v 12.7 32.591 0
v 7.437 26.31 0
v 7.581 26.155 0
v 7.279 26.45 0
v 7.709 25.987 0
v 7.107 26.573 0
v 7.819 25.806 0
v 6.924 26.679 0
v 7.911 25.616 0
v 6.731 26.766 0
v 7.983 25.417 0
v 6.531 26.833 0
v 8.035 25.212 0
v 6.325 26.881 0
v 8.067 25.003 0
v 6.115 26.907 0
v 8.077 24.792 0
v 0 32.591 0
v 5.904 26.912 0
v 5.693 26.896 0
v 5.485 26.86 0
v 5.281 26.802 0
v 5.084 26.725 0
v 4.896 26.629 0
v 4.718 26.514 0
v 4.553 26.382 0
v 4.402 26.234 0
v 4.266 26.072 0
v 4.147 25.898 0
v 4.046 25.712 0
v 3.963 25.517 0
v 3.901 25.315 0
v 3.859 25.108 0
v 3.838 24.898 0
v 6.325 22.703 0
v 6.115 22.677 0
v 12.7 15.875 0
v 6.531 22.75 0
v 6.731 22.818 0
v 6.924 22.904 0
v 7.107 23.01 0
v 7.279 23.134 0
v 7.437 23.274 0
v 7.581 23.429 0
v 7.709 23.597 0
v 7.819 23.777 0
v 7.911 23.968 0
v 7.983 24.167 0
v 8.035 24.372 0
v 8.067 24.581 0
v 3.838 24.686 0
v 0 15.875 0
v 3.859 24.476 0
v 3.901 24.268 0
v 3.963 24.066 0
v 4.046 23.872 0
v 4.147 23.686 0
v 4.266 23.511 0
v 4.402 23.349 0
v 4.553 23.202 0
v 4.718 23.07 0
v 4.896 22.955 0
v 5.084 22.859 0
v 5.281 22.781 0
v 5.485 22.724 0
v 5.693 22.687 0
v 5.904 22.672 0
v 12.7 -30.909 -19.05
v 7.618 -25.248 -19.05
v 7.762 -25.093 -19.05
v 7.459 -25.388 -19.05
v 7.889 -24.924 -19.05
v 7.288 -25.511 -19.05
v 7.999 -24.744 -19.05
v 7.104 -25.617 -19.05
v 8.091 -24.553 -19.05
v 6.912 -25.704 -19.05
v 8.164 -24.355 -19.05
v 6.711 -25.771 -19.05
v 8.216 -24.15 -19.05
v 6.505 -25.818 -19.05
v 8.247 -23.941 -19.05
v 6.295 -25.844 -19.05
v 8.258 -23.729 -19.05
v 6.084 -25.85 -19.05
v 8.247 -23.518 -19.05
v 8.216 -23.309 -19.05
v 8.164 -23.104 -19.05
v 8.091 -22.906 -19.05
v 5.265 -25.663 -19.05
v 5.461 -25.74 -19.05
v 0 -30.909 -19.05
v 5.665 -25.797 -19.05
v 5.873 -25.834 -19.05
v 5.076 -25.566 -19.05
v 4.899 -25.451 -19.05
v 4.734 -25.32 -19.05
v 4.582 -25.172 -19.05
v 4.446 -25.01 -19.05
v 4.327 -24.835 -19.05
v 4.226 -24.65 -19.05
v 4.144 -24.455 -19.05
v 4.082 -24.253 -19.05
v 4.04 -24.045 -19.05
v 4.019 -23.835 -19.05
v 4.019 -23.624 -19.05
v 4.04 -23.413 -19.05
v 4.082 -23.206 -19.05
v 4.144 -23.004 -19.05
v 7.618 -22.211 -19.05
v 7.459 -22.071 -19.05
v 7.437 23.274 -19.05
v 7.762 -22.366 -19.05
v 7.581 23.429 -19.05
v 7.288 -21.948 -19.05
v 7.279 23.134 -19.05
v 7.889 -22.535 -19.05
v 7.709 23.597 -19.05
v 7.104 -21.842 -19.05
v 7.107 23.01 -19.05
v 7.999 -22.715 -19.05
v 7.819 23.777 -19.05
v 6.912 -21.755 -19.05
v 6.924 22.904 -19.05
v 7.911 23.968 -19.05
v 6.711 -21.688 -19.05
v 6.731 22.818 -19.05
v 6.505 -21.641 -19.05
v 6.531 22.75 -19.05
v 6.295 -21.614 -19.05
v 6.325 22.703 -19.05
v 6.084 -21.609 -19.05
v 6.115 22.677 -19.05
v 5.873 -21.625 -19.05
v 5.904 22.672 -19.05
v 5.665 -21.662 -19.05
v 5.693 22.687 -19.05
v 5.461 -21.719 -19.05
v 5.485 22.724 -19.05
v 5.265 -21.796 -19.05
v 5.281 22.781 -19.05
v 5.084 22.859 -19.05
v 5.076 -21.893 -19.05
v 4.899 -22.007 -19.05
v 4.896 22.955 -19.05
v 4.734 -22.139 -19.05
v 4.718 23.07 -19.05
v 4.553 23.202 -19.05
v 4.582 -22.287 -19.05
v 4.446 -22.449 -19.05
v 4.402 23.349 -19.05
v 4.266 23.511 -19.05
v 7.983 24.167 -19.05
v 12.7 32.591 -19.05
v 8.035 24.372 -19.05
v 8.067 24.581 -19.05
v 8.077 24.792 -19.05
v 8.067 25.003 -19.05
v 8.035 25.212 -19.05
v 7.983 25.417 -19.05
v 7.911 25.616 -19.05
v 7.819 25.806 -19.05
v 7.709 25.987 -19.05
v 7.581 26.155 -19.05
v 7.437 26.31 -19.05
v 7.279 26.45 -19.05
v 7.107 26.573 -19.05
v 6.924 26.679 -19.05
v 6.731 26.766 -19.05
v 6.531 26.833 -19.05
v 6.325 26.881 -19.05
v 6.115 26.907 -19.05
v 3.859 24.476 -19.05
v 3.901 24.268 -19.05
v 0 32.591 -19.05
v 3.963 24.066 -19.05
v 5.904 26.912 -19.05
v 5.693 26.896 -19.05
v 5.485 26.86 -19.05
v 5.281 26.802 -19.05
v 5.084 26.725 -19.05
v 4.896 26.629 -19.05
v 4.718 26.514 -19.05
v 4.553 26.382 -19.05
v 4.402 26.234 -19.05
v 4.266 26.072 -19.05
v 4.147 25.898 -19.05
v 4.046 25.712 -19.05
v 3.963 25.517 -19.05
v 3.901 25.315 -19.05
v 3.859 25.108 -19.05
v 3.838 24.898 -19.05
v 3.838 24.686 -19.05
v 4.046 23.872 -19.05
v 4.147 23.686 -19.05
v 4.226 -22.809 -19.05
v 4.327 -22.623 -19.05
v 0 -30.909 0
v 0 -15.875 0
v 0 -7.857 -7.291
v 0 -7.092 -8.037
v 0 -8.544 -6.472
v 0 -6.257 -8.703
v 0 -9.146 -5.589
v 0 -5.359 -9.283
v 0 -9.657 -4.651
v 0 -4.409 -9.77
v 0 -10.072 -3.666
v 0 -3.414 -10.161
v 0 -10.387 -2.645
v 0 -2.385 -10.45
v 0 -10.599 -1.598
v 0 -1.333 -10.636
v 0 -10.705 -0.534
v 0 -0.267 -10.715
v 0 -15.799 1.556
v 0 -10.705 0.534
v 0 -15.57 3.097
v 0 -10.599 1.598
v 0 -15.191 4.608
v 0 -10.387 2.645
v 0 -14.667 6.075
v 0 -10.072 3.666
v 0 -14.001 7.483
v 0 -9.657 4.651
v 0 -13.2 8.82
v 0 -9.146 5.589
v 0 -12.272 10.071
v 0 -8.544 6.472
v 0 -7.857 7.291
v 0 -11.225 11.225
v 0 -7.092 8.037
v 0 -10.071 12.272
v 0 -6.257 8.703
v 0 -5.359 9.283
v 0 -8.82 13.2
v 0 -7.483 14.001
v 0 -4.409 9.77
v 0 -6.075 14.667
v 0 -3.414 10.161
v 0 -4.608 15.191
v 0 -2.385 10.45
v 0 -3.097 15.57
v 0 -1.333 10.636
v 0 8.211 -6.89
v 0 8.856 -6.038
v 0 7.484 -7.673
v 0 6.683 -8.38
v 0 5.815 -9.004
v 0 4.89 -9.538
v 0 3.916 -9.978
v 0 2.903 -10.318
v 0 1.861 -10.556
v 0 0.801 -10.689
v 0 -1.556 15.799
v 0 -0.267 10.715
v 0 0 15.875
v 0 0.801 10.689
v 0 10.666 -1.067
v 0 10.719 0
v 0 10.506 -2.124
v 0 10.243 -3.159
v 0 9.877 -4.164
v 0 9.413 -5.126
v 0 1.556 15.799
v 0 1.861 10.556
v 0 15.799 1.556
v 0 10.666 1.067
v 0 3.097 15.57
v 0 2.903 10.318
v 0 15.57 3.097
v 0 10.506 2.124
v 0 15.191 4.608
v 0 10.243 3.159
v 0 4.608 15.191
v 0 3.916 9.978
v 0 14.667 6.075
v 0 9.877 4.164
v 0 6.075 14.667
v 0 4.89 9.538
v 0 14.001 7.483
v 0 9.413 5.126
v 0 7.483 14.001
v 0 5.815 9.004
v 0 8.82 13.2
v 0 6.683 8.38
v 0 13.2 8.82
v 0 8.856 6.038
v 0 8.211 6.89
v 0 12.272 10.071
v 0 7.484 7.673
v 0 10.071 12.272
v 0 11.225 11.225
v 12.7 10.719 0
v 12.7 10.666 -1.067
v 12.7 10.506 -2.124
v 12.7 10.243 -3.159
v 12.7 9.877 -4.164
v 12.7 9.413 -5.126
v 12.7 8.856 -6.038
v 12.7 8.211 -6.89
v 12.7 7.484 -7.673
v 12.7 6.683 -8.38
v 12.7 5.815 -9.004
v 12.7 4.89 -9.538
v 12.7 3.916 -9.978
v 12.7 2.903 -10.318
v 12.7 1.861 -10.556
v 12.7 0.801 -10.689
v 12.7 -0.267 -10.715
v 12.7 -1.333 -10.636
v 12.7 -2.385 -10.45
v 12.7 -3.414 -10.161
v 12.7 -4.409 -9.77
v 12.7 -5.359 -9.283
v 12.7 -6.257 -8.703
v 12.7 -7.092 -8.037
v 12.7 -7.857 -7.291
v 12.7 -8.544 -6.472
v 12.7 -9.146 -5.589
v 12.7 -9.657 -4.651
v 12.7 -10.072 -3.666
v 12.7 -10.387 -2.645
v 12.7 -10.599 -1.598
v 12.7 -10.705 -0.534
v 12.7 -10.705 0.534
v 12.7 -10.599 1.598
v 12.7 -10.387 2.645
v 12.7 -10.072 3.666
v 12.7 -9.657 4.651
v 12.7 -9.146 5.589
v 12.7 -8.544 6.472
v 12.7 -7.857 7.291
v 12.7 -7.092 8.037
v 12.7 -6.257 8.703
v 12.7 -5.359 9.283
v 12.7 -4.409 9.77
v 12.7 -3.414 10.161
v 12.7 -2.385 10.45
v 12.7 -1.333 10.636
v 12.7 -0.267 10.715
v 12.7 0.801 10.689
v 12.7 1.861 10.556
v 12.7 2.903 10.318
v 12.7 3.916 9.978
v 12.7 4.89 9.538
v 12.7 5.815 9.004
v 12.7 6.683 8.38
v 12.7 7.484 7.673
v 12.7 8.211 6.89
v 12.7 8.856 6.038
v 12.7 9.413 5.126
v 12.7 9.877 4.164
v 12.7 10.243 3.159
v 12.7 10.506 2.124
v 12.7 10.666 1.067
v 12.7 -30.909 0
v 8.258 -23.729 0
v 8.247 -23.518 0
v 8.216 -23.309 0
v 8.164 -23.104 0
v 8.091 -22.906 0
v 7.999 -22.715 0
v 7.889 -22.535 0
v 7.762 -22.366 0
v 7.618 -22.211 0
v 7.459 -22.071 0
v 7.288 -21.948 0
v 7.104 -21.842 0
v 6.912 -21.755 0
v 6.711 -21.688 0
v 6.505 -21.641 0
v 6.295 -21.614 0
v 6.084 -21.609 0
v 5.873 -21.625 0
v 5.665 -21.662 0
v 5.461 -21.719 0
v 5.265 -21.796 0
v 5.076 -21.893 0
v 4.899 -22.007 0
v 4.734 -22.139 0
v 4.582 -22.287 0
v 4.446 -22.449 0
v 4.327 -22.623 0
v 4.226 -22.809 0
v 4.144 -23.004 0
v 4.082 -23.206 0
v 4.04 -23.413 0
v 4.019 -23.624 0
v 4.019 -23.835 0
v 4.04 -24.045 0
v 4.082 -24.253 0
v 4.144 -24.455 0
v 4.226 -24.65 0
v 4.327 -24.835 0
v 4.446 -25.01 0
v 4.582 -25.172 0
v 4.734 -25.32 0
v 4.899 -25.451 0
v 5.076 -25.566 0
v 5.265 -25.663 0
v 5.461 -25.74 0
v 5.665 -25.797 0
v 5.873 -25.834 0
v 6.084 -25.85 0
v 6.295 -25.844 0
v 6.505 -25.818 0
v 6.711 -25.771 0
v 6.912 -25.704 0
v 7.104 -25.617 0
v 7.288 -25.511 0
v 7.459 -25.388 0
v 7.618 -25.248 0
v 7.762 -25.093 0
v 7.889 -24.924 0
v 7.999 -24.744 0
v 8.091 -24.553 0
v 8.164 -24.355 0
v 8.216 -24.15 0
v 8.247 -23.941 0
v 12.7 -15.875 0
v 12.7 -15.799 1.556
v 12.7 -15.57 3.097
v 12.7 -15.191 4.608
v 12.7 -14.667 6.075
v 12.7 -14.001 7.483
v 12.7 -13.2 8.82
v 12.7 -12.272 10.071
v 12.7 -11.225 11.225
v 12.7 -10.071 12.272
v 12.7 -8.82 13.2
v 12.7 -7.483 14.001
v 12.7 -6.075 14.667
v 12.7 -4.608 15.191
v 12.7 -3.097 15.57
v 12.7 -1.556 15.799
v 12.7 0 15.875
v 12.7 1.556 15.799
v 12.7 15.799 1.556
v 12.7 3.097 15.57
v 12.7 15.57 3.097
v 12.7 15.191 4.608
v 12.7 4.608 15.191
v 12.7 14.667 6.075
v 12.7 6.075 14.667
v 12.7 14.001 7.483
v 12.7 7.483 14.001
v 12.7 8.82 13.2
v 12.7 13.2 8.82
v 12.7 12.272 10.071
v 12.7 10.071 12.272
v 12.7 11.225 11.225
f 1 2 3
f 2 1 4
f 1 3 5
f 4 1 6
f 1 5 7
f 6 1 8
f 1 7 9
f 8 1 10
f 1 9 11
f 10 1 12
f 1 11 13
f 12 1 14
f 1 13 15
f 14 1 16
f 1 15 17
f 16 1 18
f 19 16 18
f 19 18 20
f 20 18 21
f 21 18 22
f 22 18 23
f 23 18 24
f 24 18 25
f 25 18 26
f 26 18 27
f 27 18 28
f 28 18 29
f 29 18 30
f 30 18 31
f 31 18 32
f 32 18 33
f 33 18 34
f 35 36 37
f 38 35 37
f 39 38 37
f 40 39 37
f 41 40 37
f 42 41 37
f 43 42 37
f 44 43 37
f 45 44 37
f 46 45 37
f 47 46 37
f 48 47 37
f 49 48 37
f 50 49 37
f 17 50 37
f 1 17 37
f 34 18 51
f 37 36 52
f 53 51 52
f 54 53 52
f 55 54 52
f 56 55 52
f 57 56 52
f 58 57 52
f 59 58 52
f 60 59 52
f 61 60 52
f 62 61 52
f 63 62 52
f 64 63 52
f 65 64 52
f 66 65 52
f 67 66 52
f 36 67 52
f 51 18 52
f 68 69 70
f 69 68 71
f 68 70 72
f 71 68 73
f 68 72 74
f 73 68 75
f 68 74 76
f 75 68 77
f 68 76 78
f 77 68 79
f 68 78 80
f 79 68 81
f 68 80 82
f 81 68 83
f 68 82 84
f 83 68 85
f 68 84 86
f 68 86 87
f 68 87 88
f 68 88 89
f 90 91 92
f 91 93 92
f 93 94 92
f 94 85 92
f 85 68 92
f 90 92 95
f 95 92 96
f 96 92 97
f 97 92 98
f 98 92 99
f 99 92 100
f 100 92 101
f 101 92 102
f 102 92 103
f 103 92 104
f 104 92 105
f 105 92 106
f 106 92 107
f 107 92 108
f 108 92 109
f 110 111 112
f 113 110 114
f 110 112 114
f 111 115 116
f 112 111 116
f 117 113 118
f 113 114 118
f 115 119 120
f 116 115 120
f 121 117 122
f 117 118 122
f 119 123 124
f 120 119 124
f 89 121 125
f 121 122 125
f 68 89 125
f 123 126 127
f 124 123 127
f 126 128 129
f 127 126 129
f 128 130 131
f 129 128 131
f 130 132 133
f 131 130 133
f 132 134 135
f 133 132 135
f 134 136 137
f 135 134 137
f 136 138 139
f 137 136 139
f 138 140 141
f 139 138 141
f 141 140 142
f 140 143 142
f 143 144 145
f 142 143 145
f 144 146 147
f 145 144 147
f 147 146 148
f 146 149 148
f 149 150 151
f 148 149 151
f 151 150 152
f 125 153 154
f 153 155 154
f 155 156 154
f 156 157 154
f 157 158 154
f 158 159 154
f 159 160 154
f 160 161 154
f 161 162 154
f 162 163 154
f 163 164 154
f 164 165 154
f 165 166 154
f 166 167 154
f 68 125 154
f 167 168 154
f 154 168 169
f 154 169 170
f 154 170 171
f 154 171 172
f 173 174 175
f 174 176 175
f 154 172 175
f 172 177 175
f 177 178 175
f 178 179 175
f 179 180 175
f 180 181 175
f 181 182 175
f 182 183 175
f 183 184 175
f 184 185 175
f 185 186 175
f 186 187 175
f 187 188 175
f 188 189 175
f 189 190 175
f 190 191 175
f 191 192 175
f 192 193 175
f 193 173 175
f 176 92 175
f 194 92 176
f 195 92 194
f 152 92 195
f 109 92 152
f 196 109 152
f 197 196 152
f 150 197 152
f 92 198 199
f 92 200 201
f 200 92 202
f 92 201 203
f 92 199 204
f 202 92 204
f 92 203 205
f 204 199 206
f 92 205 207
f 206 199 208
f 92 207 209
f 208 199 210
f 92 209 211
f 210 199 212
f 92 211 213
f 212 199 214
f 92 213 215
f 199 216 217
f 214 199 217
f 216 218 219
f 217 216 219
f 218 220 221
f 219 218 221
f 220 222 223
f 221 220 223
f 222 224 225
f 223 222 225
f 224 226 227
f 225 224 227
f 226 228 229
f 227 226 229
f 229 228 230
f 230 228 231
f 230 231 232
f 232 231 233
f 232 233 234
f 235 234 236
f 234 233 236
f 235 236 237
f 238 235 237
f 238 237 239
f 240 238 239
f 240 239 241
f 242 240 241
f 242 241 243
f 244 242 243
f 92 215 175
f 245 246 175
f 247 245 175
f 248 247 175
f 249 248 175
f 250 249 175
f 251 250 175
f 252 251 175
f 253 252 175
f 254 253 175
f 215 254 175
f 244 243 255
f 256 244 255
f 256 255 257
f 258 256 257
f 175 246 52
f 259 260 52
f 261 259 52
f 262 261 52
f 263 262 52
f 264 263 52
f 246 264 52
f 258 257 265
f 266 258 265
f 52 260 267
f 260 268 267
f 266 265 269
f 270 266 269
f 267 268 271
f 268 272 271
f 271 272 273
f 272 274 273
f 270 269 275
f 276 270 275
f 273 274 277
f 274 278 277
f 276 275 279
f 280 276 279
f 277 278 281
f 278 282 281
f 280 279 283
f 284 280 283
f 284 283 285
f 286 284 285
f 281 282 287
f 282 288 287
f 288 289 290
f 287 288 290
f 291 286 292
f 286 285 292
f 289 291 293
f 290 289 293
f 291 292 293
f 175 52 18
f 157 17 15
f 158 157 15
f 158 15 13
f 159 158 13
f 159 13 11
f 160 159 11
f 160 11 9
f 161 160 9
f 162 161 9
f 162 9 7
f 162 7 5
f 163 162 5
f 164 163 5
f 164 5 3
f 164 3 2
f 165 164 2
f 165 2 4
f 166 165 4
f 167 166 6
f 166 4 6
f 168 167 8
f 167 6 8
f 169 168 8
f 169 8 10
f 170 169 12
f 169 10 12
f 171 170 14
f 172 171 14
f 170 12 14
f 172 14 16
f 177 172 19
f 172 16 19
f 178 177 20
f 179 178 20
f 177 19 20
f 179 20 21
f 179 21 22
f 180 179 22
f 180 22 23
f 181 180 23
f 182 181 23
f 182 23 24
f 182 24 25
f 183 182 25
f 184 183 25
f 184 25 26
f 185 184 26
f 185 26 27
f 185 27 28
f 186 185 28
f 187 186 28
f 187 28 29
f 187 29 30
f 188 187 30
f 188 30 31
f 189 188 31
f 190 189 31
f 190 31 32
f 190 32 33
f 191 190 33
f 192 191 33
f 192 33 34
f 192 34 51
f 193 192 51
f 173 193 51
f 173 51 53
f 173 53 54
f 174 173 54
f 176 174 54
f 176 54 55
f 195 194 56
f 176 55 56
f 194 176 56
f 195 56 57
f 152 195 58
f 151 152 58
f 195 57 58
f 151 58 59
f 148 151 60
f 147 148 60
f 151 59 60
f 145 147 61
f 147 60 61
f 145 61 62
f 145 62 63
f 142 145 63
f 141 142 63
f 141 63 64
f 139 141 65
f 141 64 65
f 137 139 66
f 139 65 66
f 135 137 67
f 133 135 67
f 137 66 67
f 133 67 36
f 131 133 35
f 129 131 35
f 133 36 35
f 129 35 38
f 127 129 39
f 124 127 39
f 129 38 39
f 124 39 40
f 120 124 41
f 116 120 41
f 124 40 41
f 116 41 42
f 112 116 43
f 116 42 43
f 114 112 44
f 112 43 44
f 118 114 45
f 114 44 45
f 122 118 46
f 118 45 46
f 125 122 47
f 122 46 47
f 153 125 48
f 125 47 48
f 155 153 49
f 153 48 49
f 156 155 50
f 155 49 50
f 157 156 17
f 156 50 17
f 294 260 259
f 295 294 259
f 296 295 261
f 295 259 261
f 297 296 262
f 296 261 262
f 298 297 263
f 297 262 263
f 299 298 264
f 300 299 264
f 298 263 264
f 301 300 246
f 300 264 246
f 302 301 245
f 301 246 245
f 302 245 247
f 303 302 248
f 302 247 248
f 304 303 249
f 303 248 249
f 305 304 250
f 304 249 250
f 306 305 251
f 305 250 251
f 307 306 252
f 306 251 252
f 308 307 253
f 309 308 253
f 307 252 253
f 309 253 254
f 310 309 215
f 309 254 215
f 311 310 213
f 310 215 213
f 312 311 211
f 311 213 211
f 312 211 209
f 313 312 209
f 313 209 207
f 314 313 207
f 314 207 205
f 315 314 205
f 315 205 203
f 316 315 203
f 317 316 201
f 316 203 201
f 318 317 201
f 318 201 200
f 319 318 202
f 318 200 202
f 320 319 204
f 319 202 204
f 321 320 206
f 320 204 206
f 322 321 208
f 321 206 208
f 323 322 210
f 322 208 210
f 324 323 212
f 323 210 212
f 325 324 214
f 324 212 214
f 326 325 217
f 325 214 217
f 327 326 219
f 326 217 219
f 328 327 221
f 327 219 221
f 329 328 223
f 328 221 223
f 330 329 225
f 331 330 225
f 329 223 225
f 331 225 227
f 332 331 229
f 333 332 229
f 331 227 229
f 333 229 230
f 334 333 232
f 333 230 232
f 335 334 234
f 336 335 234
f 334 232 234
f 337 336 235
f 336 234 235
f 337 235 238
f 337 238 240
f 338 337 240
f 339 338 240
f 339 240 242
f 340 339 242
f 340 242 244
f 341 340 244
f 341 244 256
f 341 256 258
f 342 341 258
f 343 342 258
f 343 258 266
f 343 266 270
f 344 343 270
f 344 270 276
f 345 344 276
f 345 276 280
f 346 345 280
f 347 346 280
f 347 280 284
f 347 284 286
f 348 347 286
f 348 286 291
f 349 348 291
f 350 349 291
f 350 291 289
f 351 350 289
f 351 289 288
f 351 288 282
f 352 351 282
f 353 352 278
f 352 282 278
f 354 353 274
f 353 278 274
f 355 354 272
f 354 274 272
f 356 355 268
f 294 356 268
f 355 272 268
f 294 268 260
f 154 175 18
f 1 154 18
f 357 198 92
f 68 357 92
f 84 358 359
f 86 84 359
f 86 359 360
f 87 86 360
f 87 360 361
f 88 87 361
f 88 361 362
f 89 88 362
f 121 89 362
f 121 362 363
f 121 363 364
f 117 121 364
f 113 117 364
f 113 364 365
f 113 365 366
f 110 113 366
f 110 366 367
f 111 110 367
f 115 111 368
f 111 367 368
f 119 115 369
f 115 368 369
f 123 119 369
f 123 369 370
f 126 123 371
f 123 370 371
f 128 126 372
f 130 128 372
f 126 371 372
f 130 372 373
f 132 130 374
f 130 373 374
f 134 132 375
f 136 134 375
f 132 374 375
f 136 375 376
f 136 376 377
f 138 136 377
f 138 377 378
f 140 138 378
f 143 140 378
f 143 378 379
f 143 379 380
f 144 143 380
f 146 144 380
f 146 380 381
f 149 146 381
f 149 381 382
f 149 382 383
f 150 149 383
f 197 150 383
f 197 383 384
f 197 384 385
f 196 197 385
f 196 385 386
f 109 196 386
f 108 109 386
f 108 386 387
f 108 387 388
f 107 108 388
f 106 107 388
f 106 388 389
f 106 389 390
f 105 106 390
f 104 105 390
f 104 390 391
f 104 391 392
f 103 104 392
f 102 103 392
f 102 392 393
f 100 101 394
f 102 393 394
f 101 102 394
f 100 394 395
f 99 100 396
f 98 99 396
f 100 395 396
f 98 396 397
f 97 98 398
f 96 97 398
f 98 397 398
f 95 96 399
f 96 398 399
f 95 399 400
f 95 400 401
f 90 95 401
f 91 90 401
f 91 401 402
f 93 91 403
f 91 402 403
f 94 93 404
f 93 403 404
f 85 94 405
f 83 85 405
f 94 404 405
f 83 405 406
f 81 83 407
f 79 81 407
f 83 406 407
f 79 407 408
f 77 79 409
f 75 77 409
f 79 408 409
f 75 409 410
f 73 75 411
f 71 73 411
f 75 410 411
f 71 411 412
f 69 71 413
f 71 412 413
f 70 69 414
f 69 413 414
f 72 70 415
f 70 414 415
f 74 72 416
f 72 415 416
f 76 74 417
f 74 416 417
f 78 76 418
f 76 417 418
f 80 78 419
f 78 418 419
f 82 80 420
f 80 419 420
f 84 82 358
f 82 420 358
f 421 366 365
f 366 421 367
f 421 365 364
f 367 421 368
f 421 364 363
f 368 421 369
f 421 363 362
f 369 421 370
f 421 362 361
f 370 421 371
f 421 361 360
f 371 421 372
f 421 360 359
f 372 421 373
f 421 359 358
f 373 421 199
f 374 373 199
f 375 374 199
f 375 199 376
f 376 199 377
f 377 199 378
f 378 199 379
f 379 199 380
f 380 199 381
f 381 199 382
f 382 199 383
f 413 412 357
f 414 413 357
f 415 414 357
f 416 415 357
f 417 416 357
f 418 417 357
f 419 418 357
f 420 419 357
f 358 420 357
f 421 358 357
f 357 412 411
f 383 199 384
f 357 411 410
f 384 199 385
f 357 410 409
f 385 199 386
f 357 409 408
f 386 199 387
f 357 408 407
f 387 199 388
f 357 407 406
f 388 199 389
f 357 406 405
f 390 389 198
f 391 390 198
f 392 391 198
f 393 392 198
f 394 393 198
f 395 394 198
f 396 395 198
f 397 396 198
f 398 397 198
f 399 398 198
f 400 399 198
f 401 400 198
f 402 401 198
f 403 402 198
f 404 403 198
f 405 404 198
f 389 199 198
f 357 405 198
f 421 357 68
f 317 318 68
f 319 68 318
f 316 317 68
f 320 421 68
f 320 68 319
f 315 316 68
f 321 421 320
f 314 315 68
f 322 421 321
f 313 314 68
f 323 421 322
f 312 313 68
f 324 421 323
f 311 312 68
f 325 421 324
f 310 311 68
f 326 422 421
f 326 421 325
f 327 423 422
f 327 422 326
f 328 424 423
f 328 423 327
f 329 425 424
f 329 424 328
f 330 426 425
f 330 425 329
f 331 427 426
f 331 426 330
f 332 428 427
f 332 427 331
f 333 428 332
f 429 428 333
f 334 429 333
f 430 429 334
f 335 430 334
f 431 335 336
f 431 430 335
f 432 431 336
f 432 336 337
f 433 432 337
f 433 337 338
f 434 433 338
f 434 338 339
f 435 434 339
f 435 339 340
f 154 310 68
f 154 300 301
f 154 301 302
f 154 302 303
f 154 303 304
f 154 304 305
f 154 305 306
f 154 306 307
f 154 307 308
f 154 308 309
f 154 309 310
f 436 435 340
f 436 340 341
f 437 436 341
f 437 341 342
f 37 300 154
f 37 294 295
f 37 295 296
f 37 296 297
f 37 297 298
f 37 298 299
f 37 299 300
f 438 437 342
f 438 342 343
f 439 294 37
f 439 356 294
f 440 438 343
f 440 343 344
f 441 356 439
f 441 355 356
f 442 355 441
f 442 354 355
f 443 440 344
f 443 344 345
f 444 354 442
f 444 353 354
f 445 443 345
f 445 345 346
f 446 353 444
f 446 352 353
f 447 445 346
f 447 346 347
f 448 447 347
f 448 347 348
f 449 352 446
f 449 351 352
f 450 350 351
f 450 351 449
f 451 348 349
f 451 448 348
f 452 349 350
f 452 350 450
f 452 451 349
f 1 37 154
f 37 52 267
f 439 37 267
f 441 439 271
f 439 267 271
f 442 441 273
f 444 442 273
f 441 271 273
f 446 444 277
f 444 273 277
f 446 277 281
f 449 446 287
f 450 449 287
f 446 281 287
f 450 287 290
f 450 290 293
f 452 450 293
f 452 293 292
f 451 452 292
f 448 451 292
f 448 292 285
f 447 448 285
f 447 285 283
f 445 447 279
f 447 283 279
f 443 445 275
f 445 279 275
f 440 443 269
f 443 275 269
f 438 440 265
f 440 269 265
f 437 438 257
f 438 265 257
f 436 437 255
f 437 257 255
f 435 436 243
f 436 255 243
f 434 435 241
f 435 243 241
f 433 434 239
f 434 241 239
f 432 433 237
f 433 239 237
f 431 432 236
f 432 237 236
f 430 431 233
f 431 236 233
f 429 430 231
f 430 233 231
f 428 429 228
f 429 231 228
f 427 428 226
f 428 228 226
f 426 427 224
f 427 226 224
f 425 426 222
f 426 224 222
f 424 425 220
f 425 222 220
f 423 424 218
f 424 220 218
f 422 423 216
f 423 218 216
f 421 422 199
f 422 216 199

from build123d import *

# Parameters (mm, degrees)
F1_DEPTH = 12.7
F2_R     = 2.1209
F3_DEPTH = 25.4
F4_R     = 2.1209
F5_DEPTH = 25.4


with BuildPart() as f1:
    # F0 (on Right) → F1 (new body)
    with BuildSketch(Plane.YZ):
        with BuildLine():
            Line((10.7188, 0), (15.875, 0))
            ThreePointArc((15.875, 0), (0, 15.875), (-15.875, 0))
            Line((-15.875, 0), (-10.7188, 0))
            ThreePointArc((-10.7188, 0), (0, 10.7188), (10.7188, 0))
        make_face()
        with BuildLine():
            Line((32.5907057375, 0), (15.875, 0))
            ThreePointArc((15.875, 0), (0, -15.875), (-15.875, 0))
            Line((-15.875, 0), (-30.9092942625, 0))
            Line((-30.9092942625, 0), (-30.9092942625, -19.05))
            Line((-30.9092942625, -19.05), (32.5907057375, -19.05))
            Line((32.5907057375, -19.05), (32.5907057375, 0))
        make_face()
        with BuildLine():
            ThreePointArc((-15.875, 0), (0, -15.875), (15.875, 0))
            Line((15.875, 0), (10.7188, 0))
            ThreePointArc((10.7188, 0), (0, -10.7188), (-10.7188, 0))
            Line((-10.7188, 0), (-15.875, 0))
        make_face()
    extrude(amount=F1_DEPTH)

    # F2 (on face) → F3 (cut)
    with BuildSketch(Plane.XY):
        with Locations((5.9564788826, 24.7918274254)):
            Circle(F2_R)
    extrude(amount=-F3_DEPTH, mode=Mode.SUBTRACT)

    # F4 (on face) → F5 (cut)
    with BuildSketch(Plane.XY):
        with Locations((6.1368788593, -23.7293746322)):
            Circle(F4_R)
    extrude(amount=-F5_DEPTH, mode=Mode.SUBTRACT)


solid = f1.part
